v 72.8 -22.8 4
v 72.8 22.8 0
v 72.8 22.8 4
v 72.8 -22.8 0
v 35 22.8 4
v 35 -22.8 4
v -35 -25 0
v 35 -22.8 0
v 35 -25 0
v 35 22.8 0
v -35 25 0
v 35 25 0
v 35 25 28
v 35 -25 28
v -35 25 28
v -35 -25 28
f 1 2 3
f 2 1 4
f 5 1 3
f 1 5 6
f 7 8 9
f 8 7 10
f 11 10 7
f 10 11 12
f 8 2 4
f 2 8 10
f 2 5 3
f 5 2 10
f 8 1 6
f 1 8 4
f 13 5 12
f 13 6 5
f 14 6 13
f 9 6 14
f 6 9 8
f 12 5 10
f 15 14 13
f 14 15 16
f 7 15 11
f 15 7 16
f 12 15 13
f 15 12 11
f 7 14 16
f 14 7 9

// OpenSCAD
// Two-part enclosure for a small electronics board (e.g. Arduino-based logger)
// Print orientation: box standing on the bed, lid plate flat on the bed, lip up.
// The parts are placed side by side on the +X axis with a 10 mm gap.

// ---------------- Parameters ----------------
box_x      = 70;    // box outer length (X)
box_y      = 50;    // box outer width (Y)
box_z      = 30;    // box outer height (Z)
box_wall   = 2;     // box wall thickness
box_floor  = 2;     // box floor thickness (same as wall)

lip_t      = 1.5;   // lip wall thickness
lip_h      = 4;     // lip height above plate
lip_x      = 65.6;  // lip outer length (X)
lip_y      = 45.6;  // lip outer width (Y)
lip_over   = 0.2;   // clearance between lip inner edge and box opening (each side)

gap        = 10;    // gap between the two parts on the bed
eps        = 0.5;   // cutter overshoot past faces

$fn = 64;

// ---------------- Derived ----------------
inner_x = box_x - 2 * box_wall;   // box opening length
inner_y = box_y - 2 * box_wall;   // box opening width
lip_in_x = lip_x - 2 * lip_over;  // lip inner length (should equal inner_x - 2*eps)
lip_in_y = lip_y - 2 * lip_over;  // lip inner width (should equal inner_y - 2*eps)

// ---------------- Model ----------------
union() {
    // Part 1: Box, open top
    translate([-box_x / 2, -box_y / 2, 0])
        cube([box_x, box_y, box_z - box_floor]);

    // Part 2: Lid plate with rectangular lip
    // Plate lies on the bed (z = 0), lip builds upward.
    union() {
        translate([(box_x + gap) / 2 - lip_x / 2, -lip_y / 2, 0])
            cube([lip_x, lip_y, lip_h]);

        // Lip wall on top of the plate
        translate([(box_x + gap) / 2 - lip_in_x / 2, -lip_in_y / 2, lip_h - lip_t])
            cube([lip_in_x, lip_in_y, lip_t]);
    }
}
